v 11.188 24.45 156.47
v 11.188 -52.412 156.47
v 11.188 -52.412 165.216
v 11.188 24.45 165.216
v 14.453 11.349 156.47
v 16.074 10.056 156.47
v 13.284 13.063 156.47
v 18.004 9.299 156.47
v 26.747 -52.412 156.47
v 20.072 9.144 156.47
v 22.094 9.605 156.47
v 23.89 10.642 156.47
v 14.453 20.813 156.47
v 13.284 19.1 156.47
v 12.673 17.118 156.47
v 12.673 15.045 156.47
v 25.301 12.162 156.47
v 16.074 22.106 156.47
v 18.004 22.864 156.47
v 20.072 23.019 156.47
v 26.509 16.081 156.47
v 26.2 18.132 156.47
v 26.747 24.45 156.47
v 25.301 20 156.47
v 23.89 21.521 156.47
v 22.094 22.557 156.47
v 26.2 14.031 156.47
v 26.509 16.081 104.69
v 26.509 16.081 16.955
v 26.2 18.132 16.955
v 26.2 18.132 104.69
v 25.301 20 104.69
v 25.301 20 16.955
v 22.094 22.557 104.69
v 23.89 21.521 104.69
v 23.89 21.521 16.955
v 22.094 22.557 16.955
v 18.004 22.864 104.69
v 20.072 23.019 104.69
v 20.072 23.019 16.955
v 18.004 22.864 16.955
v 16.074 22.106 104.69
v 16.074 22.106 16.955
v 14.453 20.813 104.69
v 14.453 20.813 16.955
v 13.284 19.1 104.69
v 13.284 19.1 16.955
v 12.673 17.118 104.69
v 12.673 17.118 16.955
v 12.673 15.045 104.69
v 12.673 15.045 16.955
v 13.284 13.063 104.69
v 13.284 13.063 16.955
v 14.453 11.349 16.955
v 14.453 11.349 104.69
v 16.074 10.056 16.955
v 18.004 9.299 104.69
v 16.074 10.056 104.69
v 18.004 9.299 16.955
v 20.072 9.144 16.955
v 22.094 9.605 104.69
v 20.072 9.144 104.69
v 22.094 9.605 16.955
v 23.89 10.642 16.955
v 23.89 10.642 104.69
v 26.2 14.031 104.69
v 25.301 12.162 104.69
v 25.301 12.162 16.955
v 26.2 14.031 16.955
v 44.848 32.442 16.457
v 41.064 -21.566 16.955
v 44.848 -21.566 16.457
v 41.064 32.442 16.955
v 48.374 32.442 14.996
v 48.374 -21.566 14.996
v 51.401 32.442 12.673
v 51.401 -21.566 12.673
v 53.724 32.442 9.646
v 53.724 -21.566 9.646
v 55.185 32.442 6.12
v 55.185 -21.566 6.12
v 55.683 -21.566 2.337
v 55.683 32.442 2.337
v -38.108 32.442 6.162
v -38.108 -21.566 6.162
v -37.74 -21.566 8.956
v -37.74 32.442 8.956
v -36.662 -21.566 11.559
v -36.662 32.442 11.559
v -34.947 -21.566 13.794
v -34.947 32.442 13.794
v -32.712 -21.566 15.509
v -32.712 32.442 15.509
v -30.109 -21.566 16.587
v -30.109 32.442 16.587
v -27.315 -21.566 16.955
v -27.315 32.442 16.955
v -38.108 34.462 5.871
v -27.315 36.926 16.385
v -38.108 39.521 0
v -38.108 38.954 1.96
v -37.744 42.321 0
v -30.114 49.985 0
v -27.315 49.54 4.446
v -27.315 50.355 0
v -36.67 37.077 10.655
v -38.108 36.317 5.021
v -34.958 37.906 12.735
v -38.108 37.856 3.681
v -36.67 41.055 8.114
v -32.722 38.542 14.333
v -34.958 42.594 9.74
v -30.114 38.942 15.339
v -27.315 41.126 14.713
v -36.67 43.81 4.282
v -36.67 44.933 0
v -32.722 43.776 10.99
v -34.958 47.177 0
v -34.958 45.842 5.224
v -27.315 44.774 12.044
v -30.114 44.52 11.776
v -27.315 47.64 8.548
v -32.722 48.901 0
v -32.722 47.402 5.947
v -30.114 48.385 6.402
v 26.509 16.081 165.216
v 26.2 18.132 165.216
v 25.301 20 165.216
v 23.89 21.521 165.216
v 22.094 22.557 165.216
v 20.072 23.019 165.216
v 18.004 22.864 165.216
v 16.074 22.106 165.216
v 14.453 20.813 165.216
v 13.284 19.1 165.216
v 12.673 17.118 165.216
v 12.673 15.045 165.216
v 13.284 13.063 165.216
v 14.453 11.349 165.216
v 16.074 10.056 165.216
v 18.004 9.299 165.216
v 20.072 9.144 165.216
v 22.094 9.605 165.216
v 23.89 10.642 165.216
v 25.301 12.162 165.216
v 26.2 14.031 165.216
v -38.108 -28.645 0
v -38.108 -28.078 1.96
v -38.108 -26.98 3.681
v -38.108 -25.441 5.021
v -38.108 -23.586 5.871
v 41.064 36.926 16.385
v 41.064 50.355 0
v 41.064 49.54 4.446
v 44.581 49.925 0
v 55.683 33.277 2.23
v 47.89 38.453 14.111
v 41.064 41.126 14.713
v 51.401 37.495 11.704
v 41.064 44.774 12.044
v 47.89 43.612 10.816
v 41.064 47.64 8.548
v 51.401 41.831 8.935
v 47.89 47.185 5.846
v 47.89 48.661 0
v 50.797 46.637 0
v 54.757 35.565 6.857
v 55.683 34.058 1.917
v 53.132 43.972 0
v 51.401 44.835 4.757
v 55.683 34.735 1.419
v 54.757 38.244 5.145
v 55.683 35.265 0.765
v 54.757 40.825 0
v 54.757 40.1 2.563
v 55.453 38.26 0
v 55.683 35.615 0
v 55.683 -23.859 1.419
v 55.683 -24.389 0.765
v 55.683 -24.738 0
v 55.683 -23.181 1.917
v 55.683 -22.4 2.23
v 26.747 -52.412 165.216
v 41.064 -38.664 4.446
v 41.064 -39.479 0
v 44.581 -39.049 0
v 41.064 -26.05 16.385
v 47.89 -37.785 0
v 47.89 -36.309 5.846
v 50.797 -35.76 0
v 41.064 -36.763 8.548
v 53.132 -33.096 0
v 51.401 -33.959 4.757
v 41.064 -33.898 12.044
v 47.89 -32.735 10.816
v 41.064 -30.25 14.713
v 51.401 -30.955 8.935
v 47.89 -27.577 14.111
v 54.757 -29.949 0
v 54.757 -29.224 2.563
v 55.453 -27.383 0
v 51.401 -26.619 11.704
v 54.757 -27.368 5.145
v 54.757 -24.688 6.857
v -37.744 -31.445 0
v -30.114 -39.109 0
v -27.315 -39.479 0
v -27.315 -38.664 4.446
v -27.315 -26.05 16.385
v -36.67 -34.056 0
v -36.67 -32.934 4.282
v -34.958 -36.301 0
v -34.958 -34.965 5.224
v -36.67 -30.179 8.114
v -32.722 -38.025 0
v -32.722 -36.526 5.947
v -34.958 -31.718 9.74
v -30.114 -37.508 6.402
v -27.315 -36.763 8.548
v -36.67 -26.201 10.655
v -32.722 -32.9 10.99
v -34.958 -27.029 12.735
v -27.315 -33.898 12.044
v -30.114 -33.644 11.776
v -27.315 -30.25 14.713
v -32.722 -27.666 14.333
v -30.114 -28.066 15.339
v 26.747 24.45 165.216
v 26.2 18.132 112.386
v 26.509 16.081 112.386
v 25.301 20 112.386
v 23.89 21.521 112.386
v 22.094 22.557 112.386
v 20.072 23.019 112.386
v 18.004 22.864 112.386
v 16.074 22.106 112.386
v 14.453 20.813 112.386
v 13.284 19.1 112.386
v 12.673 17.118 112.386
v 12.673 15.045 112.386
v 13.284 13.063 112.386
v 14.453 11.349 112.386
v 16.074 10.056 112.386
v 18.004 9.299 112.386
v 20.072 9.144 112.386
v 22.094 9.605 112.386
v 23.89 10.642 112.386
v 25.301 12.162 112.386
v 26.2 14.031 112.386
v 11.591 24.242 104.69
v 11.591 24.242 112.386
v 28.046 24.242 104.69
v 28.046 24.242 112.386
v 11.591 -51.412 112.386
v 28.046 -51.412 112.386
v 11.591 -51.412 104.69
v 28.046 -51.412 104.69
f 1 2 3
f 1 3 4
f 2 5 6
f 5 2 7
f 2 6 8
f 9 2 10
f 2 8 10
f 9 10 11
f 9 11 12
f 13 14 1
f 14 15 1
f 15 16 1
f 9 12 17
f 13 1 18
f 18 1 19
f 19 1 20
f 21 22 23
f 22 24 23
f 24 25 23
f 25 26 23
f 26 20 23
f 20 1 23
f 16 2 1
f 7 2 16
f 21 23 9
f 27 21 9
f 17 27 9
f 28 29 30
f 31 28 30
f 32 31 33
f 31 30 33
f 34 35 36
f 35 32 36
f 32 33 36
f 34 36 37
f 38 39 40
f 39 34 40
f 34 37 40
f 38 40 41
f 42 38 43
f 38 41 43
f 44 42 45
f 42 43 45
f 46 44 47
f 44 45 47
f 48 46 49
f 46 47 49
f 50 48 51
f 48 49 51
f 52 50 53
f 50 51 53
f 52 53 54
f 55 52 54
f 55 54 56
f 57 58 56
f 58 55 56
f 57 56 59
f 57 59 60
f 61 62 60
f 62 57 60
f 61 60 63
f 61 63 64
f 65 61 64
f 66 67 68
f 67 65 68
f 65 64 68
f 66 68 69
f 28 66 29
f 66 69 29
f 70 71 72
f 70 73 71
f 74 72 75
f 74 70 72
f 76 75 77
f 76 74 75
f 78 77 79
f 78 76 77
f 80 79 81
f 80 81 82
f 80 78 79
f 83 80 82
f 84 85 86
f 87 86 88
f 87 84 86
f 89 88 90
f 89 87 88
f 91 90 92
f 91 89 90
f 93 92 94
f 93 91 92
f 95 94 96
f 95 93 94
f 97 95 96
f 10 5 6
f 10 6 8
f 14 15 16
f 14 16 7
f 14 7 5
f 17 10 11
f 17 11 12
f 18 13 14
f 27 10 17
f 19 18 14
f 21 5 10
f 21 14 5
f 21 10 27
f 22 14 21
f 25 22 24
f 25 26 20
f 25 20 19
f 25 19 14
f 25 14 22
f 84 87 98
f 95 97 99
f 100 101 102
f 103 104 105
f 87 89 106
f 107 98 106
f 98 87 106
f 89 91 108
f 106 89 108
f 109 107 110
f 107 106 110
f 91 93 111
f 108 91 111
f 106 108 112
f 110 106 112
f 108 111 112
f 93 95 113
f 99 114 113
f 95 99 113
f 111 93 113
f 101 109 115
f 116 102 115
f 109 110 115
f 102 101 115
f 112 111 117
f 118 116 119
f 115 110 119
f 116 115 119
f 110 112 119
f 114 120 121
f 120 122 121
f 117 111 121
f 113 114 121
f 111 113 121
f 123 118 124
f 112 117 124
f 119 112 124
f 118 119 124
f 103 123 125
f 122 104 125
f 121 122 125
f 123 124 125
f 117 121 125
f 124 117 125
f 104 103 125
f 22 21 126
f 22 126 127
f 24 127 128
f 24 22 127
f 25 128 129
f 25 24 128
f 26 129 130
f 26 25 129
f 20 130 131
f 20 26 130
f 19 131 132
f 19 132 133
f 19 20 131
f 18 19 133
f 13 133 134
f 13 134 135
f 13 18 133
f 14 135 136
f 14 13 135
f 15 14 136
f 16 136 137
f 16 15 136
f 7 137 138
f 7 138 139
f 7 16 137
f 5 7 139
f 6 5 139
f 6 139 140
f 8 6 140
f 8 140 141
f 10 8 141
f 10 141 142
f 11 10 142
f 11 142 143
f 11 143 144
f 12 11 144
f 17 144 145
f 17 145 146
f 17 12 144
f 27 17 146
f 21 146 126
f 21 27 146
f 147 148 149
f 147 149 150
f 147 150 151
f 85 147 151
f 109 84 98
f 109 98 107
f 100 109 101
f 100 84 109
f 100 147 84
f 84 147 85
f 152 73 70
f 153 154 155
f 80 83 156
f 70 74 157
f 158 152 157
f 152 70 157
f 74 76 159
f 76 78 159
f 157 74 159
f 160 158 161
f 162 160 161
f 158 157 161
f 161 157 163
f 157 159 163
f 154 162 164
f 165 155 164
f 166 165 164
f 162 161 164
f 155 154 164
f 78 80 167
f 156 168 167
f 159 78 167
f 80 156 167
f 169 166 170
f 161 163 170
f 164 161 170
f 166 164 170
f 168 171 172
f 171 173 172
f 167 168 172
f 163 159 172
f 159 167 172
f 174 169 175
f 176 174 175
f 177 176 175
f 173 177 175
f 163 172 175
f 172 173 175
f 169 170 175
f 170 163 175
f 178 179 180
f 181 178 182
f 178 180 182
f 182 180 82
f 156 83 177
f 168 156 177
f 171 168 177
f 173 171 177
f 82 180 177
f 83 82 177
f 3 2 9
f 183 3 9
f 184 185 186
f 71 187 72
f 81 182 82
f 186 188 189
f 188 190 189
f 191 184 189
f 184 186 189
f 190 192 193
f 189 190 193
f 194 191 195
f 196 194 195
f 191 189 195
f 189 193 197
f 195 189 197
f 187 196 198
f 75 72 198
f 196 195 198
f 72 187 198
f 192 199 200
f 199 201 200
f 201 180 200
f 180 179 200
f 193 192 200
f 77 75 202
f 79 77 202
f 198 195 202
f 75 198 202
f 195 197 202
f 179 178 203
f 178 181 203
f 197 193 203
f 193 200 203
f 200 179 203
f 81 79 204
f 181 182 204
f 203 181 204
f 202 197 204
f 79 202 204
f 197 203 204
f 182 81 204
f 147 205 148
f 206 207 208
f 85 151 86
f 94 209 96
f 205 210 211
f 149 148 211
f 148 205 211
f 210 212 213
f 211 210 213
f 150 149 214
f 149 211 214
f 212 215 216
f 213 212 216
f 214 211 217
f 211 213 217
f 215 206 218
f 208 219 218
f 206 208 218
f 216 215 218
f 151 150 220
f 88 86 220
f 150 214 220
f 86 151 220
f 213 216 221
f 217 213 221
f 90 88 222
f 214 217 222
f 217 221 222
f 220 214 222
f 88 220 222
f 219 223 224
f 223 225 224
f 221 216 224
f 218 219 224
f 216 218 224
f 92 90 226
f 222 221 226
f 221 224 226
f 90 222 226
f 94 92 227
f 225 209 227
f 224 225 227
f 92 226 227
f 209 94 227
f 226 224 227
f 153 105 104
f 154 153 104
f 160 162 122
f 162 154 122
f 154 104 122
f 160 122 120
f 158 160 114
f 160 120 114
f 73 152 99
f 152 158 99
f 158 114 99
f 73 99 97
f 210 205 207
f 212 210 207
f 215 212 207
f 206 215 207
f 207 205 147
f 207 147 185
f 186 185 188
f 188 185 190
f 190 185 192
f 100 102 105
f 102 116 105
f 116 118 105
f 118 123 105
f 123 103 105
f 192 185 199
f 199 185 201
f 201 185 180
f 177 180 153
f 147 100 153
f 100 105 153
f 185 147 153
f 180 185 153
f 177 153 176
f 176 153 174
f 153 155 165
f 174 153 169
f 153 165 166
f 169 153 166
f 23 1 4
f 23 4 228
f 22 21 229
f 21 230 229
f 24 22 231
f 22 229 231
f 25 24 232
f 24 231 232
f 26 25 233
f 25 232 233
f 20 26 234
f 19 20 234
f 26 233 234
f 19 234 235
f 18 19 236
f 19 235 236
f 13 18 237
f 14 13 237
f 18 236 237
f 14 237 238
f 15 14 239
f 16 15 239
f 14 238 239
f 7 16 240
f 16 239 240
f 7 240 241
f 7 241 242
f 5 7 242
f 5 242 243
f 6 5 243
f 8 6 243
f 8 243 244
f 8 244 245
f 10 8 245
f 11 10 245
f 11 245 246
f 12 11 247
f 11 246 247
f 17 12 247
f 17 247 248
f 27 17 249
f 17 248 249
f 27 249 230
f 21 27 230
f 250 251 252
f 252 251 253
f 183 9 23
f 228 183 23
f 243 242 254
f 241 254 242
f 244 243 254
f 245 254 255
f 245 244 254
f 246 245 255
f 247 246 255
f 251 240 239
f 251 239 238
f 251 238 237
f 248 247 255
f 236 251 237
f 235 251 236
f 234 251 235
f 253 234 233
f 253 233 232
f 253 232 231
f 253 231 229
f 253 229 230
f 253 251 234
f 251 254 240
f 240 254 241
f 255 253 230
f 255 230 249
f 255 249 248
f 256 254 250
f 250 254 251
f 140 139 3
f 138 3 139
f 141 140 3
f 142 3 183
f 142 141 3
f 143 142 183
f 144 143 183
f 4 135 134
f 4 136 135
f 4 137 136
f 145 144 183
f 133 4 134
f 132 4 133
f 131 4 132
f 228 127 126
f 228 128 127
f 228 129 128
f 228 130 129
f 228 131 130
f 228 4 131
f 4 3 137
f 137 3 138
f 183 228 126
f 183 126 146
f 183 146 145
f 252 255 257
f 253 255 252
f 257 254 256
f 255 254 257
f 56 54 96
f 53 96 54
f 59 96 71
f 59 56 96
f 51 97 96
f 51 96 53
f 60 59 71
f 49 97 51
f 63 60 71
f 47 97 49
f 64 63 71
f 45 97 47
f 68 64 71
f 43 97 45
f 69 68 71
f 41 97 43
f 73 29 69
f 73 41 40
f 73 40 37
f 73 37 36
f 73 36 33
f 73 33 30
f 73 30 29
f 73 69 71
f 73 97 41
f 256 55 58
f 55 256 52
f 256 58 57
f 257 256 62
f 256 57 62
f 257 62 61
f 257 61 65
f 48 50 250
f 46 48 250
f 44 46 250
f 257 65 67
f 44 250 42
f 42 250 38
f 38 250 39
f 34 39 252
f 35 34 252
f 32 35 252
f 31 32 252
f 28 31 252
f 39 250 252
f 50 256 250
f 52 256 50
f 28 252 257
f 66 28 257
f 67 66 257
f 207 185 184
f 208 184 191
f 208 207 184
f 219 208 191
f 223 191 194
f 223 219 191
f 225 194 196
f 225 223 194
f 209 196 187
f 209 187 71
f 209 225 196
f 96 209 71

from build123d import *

# Parameters (mm, degrees)
F0_W        = 93.7904641032
F0_H        = 89.8338183761
F1_DEPTH    = 16.9549565762
F2_T1_DEPTH = 183.3558146052
F3_R        = 10.7925712466
F4_R        = 14.6181693704
F5_R        = 6.9569907431
F6_DEPTH    = 112.9271313548
F8_W        = 16.4551511407
F8_H        = 75.6539739668
F9_DEPTH    = 7.6955053955
F10_DEPTH   = 43.5431748629
F11_W       = 15.558283776
F11_H       = 76.8622979522
F11_R       = 6.9569907431
F12_DEPTH   = 8.7455324829


# Not quite as in the source:
# - a fillet or chamfer that OpenCascade refuses, or shapes differently, is made with other operations: its cross-section is extruded or revolved along the edge and cut away or added


with BuildPart() as f1:
    # F0 (on Top) → F1 (new body)
    with BuildSketch(Plane.XY):
        with Locations((8.7873749435, 5.4381676018)):
            Rectangle(F0_W, F0_H)
    extrude(amount=F1_DEPTH)

    # F2: fillet of radius 17.9401412852 on 2 edges, made by hand

    # F2_s2 → F2_t1 (cut)
    with BuildSketch(Plane.YZ.offset(-82.8905323591)):
        with BuildLine():
            ThreePointArc((-39.4787415862, 0), (-33.8980337182, 12.0440712599), (-21.5656714858, 16.9549565762))
            Line((-21.5656714858, 16.9549565762), (-39.4787415862, 16.9549565762))
            Line((-39.4787415862, 16.9549565762), (-39.4787415862, 0))
        make_face()
        with BuildLine():
            ThreePointArc((50.3550767899, 0), (44.7743689219, 12.0440712599), (32.4420066895, 16.9549565762))
            Line((32.4420066895, 16.9549565762), (50.3550767899, 16.9549565762))
            Line((50.3550767899, 16.9549565762), (50.3550767899, 0))
        make_face()
    extrude(amount=F2_T1_DEPTH, mode=Mode.SUBTRACT)

    # F3
    f3_edges = [f1.edges().sort_by_distance(p)[0] for p in [
        (-38.107857, 5.438168, 16.954957),
        (-38.107857, -33.898034, 12.044071),
        (-38.107857, 44.774369, 12.044071),
    ]]
    fillet(f3_edges, radius=F3_R)

    # F4
    f4_edges = [f1.edges().sort_by_distance(p)[0] for p in [
        (55.682607, 44.774369, 12.044071),
        (55.682607, 5.438168, 16.954957),
        (55.682607, -33.898034, 12.044071),
    ]]
    fillet(f4_edges, radius=F4_R)

    # F5 (on Top) → F6 (join)
    with BuildSketch(Plane.XY):
        with Locations((19.552404061, 16.0813909024)):
            Circle(F5_R)
    extrude(amount=F6_DEPTH)

    # F8 (on offset) → F9 (join)
    with BuildSketch(Plane.XY.offset(112.385711167)):
        with Locations((19.8183581233, -13.5854128748)):
            Rectangle(F8_W, F8_H)
    extrude(amount=-F9_DEPTH)

    # F10 (add): a face of the model
    f10_faces = [f1.faces().sort_by_distance(p)[0] for p in [
        (19.552404061, 16.0813909024, 112.9271313548),
    ]]
    extrude(f10_faces, amount=F10_DEPTH)


with BuildPart() as f12:
    # F11 (on face) → F12 (new body)
    with BuildSketch(Plane.XY.offset(156.4703062177)):
        with Locations((18.967570737, -13.9813087881)):
            Rectangle(F11_W, F11_H)
        with Locations((19.552404061, 16.0813909024)):
            Circle(F11_R, mode=Mode.SUBTRACT)
    extrude(amount=F12_DEPTH)


solid = Compound([f1.part, f12.part])
